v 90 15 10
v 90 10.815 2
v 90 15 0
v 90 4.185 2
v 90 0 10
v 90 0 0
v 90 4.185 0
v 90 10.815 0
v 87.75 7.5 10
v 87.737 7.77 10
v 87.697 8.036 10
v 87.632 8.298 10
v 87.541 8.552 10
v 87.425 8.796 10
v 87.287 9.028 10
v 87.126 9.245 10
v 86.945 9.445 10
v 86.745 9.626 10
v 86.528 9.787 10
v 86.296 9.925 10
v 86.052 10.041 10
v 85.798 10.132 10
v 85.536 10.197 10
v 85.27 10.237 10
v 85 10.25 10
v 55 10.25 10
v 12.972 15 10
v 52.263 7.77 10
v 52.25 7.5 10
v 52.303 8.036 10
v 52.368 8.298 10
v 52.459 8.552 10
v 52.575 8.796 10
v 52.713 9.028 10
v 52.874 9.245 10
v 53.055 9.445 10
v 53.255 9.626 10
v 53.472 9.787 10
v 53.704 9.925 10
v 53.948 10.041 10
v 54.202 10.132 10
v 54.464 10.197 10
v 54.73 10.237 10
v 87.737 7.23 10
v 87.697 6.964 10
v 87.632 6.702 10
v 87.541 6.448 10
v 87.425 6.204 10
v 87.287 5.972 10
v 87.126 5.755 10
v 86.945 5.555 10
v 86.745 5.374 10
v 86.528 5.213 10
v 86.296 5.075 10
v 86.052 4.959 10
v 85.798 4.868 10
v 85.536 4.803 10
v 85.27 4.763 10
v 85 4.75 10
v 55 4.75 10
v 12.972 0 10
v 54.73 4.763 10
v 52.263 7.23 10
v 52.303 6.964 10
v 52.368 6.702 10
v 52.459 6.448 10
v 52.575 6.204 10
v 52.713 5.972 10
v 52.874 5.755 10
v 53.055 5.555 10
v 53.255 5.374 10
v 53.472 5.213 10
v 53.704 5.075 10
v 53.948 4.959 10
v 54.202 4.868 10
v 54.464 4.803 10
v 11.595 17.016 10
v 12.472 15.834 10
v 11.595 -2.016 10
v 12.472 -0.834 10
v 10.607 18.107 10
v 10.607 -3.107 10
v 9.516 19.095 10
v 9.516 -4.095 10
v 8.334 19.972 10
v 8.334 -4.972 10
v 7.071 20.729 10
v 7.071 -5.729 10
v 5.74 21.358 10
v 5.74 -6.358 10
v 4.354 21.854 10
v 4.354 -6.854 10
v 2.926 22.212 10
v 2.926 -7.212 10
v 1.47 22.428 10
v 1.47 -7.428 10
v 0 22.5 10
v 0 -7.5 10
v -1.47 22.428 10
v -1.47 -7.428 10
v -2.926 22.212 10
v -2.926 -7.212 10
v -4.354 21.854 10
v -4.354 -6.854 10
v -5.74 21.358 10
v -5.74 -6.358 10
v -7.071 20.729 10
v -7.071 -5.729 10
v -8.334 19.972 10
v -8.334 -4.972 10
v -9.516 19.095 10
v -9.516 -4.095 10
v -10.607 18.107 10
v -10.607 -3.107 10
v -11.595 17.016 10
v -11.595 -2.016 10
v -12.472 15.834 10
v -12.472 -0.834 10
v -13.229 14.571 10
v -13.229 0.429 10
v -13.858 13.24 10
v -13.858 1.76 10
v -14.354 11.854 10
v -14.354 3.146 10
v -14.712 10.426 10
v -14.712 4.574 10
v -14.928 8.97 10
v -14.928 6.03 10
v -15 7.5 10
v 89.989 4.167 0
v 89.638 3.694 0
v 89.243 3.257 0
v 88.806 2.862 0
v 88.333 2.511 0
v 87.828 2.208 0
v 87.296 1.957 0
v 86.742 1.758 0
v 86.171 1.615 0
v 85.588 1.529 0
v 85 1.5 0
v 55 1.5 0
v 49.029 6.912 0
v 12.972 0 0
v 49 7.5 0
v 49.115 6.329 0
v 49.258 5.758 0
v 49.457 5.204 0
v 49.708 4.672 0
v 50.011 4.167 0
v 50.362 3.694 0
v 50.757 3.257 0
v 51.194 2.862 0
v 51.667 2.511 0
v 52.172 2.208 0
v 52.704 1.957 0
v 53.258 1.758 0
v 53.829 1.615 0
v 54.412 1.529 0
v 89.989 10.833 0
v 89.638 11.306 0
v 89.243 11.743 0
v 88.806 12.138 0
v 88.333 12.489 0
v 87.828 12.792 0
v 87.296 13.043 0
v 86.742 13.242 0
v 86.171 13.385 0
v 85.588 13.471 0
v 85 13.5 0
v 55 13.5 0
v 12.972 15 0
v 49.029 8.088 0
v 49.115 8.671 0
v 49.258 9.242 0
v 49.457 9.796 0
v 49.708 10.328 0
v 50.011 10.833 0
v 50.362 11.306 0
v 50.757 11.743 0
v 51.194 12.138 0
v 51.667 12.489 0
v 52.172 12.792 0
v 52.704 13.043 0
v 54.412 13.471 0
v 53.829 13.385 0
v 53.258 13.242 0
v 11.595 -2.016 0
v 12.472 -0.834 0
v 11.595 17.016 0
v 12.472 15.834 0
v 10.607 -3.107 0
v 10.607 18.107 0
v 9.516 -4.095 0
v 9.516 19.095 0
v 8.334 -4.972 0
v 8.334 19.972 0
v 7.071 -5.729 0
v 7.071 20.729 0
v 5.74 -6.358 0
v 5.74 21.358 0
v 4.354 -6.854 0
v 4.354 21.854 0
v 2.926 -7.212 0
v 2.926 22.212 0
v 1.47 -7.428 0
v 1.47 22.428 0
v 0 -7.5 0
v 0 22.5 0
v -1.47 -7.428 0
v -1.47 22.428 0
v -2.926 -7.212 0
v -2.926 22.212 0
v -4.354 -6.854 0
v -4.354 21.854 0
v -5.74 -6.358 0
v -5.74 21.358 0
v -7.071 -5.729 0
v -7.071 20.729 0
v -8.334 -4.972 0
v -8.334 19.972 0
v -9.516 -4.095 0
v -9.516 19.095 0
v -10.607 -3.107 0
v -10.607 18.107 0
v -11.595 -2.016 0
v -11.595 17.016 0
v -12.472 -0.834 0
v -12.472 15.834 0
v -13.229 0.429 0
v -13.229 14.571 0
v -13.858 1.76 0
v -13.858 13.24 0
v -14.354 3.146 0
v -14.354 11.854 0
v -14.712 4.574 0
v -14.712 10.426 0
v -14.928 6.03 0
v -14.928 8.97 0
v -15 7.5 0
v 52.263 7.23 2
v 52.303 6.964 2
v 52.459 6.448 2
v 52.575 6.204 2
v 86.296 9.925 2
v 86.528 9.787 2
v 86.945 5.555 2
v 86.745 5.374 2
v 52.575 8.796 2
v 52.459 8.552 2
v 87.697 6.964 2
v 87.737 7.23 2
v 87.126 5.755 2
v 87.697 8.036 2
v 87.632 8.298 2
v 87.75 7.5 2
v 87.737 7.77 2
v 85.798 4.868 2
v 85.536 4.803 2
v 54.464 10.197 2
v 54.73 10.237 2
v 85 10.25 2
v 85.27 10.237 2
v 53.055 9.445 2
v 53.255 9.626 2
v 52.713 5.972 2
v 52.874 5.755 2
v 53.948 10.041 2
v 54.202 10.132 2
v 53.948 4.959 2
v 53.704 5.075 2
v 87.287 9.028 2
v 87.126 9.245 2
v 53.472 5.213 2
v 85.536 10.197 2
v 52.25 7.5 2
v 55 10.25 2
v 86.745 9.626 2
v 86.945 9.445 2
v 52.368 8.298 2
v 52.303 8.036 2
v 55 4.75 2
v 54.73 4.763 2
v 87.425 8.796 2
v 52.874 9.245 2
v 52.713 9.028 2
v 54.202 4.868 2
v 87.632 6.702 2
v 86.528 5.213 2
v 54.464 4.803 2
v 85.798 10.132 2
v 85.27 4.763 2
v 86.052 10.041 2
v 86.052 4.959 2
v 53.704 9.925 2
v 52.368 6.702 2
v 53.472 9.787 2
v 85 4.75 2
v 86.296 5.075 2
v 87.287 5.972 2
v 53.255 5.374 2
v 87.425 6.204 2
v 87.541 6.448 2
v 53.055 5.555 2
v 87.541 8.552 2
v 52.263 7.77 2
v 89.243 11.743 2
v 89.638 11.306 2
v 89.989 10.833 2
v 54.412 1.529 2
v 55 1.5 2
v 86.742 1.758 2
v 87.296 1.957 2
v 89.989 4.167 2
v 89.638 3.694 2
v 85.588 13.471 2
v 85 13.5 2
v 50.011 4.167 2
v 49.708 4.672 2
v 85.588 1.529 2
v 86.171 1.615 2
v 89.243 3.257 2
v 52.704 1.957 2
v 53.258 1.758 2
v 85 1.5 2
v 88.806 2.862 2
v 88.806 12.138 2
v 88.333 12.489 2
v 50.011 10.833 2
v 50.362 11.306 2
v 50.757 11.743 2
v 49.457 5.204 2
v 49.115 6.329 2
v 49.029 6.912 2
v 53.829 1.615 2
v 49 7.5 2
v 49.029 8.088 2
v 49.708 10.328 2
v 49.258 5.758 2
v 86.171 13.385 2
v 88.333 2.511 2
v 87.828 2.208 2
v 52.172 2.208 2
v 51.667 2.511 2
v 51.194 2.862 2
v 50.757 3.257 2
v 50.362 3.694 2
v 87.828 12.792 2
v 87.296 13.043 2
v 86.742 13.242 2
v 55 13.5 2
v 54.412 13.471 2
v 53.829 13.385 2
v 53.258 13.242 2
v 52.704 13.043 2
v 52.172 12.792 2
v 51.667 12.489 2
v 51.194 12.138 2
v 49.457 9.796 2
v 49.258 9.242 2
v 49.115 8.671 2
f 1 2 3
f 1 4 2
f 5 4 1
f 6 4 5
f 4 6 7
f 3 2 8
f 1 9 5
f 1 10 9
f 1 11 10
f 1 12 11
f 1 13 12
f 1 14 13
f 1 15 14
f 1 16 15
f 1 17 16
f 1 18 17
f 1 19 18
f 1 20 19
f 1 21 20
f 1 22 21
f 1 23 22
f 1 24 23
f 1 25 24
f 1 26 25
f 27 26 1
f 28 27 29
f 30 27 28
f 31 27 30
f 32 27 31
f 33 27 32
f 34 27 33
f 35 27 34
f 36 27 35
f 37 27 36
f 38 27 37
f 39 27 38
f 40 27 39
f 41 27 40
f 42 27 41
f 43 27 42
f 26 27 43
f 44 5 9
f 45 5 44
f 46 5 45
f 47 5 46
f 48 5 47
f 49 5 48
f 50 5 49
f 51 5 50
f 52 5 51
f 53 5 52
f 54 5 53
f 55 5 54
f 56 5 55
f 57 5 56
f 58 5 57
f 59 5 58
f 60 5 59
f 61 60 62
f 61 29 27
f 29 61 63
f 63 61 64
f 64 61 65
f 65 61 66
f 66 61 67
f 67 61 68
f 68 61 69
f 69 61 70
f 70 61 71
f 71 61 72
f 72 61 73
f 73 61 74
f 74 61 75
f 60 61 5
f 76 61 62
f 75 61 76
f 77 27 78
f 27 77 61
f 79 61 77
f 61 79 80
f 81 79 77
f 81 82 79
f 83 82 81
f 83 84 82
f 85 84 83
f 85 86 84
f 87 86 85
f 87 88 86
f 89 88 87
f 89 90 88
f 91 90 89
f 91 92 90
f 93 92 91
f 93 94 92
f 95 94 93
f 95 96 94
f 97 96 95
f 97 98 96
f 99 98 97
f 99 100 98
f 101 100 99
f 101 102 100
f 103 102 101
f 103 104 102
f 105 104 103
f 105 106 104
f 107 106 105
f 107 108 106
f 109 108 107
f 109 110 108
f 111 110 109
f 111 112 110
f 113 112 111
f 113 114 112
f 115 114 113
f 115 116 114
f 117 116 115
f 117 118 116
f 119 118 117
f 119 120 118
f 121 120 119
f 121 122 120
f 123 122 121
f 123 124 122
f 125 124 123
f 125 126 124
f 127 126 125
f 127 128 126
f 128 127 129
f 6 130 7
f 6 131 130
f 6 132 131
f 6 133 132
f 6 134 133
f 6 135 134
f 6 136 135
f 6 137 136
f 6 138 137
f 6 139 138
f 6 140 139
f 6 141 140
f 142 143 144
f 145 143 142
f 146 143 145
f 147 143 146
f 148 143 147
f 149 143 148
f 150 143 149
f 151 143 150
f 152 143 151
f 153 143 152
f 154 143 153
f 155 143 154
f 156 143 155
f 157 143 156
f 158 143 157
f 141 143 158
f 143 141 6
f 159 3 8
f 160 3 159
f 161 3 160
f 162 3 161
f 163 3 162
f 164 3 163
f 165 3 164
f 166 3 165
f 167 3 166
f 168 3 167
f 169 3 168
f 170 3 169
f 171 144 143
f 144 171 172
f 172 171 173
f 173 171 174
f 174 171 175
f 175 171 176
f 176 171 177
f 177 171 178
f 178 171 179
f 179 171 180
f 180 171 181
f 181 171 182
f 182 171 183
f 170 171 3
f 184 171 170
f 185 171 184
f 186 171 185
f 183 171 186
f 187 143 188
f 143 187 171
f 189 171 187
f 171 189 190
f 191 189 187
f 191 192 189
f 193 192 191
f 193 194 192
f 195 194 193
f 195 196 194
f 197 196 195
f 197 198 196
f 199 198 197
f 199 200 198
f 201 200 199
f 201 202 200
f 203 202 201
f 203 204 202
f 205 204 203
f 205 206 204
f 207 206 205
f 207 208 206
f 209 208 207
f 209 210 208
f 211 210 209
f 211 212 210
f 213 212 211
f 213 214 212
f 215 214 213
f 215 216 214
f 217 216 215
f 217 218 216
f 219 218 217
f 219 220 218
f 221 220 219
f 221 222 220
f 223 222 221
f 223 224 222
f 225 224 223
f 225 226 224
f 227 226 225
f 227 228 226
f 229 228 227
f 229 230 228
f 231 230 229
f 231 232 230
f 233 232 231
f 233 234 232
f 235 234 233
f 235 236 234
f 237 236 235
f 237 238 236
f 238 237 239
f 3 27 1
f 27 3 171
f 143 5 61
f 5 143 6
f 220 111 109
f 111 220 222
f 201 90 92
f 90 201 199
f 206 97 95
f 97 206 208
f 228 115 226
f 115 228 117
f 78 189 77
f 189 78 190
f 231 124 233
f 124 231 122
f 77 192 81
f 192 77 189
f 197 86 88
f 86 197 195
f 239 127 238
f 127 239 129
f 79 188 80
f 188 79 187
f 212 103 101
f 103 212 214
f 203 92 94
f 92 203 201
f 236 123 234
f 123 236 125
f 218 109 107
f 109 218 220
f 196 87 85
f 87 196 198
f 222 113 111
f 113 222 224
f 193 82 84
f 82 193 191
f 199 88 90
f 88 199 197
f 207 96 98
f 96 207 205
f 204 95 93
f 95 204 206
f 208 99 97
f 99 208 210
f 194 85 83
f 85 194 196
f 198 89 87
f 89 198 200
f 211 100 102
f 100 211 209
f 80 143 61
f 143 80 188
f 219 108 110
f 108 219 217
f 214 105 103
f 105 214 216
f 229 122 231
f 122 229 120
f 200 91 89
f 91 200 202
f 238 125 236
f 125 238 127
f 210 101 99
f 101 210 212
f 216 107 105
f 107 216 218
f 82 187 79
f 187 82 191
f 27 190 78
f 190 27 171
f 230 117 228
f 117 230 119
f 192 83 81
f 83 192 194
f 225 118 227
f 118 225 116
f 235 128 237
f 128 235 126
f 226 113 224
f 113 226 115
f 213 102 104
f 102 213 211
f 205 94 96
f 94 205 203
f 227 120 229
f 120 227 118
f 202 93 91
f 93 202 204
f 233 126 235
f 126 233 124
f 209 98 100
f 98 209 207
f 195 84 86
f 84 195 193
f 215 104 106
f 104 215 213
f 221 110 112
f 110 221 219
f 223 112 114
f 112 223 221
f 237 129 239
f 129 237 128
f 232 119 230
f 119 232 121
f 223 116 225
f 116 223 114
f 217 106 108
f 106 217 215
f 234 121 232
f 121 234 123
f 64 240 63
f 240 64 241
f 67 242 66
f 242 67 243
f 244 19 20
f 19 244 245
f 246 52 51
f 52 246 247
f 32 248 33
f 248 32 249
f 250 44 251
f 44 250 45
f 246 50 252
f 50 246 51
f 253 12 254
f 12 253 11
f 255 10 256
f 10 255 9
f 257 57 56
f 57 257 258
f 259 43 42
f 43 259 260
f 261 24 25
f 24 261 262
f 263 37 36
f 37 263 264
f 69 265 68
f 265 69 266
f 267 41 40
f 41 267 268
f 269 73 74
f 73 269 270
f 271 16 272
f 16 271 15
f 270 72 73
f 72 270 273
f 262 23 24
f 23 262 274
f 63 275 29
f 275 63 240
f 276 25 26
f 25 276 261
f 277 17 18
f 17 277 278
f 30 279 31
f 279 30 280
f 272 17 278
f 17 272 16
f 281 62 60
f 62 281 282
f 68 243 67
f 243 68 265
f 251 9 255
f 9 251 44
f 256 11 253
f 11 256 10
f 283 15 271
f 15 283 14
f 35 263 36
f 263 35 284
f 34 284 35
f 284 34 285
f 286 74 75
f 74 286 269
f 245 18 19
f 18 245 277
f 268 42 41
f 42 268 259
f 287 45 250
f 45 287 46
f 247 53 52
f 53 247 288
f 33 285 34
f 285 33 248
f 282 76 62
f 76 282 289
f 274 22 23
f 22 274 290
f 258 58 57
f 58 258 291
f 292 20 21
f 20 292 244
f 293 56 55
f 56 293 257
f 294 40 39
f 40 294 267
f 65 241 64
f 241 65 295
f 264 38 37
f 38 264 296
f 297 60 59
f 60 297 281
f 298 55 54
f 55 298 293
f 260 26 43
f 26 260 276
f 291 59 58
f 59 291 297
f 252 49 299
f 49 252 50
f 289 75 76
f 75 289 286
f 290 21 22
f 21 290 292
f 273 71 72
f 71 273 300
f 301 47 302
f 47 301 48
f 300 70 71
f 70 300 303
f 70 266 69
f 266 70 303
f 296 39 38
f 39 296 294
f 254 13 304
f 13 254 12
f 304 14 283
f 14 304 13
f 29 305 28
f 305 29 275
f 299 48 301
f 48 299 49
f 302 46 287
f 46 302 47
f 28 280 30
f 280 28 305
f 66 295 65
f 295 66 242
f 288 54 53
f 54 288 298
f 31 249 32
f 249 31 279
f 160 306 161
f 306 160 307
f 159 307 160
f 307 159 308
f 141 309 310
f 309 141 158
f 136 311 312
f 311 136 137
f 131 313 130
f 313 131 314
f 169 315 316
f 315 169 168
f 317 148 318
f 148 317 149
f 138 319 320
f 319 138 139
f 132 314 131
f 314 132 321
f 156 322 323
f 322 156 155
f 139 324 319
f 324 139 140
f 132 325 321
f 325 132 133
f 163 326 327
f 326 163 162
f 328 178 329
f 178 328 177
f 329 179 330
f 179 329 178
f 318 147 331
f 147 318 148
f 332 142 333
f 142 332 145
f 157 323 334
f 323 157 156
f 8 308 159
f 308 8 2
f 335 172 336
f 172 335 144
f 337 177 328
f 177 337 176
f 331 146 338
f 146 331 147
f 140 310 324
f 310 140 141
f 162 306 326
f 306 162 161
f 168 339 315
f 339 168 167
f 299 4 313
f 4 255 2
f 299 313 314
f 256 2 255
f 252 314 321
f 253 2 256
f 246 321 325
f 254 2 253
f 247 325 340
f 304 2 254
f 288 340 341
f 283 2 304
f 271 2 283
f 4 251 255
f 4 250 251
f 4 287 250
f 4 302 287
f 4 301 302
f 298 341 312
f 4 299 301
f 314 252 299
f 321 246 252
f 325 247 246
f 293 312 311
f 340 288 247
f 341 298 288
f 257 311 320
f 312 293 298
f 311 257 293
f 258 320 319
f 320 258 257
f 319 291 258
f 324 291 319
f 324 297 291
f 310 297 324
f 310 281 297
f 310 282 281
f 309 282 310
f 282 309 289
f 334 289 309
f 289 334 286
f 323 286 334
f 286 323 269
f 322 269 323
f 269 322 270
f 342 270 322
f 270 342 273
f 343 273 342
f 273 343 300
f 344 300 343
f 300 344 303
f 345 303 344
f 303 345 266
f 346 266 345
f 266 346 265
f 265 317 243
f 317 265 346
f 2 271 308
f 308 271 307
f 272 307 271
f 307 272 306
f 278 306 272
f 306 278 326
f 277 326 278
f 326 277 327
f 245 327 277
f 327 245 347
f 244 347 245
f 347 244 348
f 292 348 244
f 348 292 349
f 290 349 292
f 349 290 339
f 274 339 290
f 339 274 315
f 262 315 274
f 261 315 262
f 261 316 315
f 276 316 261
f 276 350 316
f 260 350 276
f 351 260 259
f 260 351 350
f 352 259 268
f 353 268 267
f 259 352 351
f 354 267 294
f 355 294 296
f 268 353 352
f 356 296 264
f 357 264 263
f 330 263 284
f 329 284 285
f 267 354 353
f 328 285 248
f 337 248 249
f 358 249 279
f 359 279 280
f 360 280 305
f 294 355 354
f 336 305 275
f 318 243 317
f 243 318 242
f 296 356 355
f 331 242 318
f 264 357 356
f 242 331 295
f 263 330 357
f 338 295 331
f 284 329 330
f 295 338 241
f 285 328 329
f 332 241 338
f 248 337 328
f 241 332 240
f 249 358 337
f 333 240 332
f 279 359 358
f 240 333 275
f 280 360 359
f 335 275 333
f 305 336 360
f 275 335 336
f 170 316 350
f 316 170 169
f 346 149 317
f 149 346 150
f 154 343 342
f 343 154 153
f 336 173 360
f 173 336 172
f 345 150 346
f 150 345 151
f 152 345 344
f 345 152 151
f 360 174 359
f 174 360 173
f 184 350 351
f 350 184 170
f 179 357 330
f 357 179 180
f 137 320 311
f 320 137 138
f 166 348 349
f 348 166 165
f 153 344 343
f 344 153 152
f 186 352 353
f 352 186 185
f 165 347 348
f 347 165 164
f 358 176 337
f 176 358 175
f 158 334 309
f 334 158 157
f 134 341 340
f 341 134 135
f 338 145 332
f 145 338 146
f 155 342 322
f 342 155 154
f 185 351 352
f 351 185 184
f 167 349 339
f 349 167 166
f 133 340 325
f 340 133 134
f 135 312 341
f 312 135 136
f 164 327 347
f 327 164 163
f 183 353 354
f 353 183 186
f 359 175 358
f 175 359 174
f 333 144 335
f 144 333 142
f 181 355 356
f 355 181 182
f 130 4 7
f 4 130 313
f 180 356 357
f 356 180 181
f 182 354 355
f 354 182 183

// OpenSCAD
// file: _adjustable_bracket.scad
// =====================================
// Adjustable Bracket
// Two interlocking pieces with bolt adjustment
// =====================================
// One end has a rounded head to rest against a wall.
// The other end has a U-channel bracket that hooks over
// something below it (21mm gap along bar, 30mm deep down).
// The two pieces bolt together through a slot, making
// the total span adjustable (centre: 140mm).
//
// Measurements (from sketch):
//   Total span (adjustable): ~125-155mm (centre 140mm)
//   Bracket gap: 21mm (along bar axis)
//   Bracket depth: 30mm (downward)
//   Thickness: 10mm (1cm)
//   Bolt: M5 with nut and washers

$fn = 64;

// === Parameters (mm) ===
thickness       = 10;       // 1cm depth
bar_width       = 15;       // width of the overlap bar
bracket_gap     = 21;       // internal gap of bracket channel (along bar axis)
bracket_depth   = 30;       // bracket depth downward from bar
wall_t          = 5;        // bracket wall thickness
head_diameter   = 30;       // rounded wall-rest head diameter

// Bolt / slot
slot_length     = 30;       // adjustment slot length (~±15mm range)
bolt_clearance  = 5.5;      // M5 bolt clearance hole
washer_dia      = 12;       // washer recess diameter
washer_depth    = 2;        // washer recess depth

// Layout
total_span      = 140;      // centre of adjustment range
overlap         = 40;       // bar overlap at centre position

// Derived
piece_length    = (total_span + overlap) / 2;  // 90mm each

// === Piece A: Wall piece with rounded head ===
module piece_a() {
    difference() {
        union() {
            // Main bar
            cube([piece_length, bar_width, thickness]);

            // Rounded head at x=0 (wider than bar, for wall contact)
            translate([0, bar_width/2, 0])
                cylinder(d = head_diameter, h = thickness);
        }

        // Adjustment slot (in the overlap zone)
        slot_x = piece_length - overlap + 5;
        translate([slot_x, bar_width/2, -0.1])
            hull() {
                cylinder(d = bolt_clearance, h = thickness + 0.2);
                translate([slot_length, 0, 0])
                    cylinder(d = bolt_clearance, h = thickness + 0.2);
            }

        // Washer recess on bottom (nut side when assembled)
        translate([slot_x, bar_width/2, -0.1])
            hull() {
                cylinder(d = washer_dia, h = washer_depth + 0.1);
                translate([slot_length, 0, 0])
                    cylinder(d = washer_dia, h = washer_depth + 0.1);
            }
    }
}

// === Piece B: Bracket piece ===
// Bracket is a U-channel at the bar end, opening downward.
// Two walls drop down from the bar with a 21mm gap between them,
// connected at the bottom. Hooks over a rail/shelf edge from above.
module piece_b() {
    bracket_start_x = piece_length - 2*wall_t - bracket_gap;

    difference() {
        union() {
            // Main bar
            cube([piece_length, bar_width, thickness]);

            // Outer wall (at bar end)
            translate([piece_length - wall_t, -bracket_depth, 0])
                cube([wall_t, bracket_depth, thickness]);

            // Inner wall (bracket_gap away from outer wall)
            translate([bracket_start_x, -bracket_depth, 0])
                cube([wall_t, bracket_depth, thickness]);


        }

        // Bolt hole (round - the slot is on piece A)
        translate([overlap/2, bar_width/2, -0.1])
            cylinder(d = bolt_clearance, h = thickness + 0.2);

        // Washer recess on top (bolt head side when assembled)
        translate([overlap/2, bar_width/2, thickness - washer_depth])
            cylinder(d = washer_dia, h = washer_depth + 0.1);
    }
}

// === Assembly view ===
// This file is a shared library. Render individual pieces via:
//   piece_a.scad  ->  piece_a.stl
//   piece_b.scad  ->  piece_b.stl
// main file
// Adjustable Bracket - Piece A (wall piece with rounded head)
// Render this file to generate piece_a.stl

include <_adjustable_bracket.scad>

piece_a();
